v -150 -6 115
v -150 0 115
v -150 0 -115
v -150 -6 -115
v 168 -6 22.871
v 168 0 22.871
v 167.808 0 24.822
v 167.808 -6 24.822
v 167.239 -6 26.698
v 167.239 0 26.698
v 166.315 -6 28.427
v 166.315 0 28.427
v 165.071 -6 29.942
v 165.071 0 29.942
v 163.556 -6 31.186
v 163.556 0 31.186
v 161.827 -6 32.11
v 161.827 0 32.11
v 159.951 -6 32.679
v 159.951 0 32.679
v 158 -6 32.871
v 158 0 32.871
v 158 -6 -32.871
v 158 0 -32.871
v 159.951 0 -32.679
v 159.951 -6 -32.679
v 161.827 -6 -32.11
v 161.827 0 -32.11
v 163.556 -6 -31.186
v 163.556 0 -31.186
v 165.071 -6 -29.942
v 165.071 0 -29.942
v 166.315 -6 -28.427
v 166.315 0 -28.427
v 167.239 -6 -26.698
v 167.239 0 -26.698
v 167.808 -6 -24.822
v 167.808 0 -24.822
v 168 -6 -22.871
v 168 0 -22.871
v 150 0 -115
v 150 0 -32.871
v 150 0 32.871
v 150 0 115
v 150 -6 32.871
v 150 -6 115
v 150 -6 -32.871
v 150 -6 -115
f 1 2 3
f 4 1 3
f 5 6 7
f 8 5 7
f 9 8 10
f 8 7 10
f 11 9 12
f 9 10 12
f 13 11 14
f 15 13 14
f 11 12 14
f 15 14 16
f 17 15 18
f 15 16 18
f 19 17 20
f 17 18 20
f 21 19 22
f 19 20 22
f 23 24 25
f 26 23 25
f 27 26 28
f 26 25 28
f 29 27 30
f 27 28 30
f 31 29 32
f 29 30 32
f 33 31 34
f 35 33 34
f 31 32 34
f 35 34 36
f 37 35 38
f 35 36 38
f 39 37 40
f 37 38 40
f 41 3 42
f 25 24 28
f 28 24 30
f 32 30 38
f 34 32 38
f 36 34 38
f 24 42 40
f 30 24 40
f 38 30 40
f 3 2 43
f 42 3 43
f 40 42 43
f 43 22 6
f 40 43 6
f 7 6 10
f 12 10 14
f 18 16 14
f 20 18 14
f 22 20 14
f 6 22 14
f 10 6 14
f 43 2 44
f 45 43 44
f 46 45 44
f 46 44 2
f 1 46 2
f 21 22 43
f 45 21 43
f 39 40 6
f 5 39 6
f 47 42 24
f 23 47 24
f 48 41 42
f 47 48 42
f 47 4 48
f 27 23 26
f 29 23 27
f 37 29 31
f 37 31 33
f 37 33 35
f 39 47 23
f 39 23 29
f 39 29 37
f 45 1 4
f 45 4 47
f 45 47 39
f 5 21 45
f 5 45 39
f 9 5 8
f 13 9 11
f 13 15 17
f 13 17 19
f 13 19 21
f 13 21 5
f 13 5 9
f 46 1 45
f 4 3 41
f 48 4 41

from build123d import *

# Parameters (mm, degrees)
F1_DEPTH = 6


with BuildPart() as f1:
    # F0 (on Front) → F1 (new body)
    with BuildSketch(Plane.XZ):
        with BuildLine():
            Line((-150, -115), (150, -115))
            Line((150, -115), (150, -32.871023))
            Line((150, -32.871023), (158, -32.871023))
            ThreePointArc((158, -32.871023), (165.071068, -29.942091), (168, -22.871023))
            Line((168, -22.871023), (168, 22.871023))
            ThreePointArc((168, 22.871023), (165.071068, 29.942091), (158, 32.871023))
            Line((158, 32.871023), (150, 32.871023))
            Line((150, 32.871023), (150, 115))
            Line((150, 115), (-150, 115))
            Line((-150, 115), (-150, -115))
        make_face()
    extrude(amount=F1_DEPTH)


solid = f1.part
